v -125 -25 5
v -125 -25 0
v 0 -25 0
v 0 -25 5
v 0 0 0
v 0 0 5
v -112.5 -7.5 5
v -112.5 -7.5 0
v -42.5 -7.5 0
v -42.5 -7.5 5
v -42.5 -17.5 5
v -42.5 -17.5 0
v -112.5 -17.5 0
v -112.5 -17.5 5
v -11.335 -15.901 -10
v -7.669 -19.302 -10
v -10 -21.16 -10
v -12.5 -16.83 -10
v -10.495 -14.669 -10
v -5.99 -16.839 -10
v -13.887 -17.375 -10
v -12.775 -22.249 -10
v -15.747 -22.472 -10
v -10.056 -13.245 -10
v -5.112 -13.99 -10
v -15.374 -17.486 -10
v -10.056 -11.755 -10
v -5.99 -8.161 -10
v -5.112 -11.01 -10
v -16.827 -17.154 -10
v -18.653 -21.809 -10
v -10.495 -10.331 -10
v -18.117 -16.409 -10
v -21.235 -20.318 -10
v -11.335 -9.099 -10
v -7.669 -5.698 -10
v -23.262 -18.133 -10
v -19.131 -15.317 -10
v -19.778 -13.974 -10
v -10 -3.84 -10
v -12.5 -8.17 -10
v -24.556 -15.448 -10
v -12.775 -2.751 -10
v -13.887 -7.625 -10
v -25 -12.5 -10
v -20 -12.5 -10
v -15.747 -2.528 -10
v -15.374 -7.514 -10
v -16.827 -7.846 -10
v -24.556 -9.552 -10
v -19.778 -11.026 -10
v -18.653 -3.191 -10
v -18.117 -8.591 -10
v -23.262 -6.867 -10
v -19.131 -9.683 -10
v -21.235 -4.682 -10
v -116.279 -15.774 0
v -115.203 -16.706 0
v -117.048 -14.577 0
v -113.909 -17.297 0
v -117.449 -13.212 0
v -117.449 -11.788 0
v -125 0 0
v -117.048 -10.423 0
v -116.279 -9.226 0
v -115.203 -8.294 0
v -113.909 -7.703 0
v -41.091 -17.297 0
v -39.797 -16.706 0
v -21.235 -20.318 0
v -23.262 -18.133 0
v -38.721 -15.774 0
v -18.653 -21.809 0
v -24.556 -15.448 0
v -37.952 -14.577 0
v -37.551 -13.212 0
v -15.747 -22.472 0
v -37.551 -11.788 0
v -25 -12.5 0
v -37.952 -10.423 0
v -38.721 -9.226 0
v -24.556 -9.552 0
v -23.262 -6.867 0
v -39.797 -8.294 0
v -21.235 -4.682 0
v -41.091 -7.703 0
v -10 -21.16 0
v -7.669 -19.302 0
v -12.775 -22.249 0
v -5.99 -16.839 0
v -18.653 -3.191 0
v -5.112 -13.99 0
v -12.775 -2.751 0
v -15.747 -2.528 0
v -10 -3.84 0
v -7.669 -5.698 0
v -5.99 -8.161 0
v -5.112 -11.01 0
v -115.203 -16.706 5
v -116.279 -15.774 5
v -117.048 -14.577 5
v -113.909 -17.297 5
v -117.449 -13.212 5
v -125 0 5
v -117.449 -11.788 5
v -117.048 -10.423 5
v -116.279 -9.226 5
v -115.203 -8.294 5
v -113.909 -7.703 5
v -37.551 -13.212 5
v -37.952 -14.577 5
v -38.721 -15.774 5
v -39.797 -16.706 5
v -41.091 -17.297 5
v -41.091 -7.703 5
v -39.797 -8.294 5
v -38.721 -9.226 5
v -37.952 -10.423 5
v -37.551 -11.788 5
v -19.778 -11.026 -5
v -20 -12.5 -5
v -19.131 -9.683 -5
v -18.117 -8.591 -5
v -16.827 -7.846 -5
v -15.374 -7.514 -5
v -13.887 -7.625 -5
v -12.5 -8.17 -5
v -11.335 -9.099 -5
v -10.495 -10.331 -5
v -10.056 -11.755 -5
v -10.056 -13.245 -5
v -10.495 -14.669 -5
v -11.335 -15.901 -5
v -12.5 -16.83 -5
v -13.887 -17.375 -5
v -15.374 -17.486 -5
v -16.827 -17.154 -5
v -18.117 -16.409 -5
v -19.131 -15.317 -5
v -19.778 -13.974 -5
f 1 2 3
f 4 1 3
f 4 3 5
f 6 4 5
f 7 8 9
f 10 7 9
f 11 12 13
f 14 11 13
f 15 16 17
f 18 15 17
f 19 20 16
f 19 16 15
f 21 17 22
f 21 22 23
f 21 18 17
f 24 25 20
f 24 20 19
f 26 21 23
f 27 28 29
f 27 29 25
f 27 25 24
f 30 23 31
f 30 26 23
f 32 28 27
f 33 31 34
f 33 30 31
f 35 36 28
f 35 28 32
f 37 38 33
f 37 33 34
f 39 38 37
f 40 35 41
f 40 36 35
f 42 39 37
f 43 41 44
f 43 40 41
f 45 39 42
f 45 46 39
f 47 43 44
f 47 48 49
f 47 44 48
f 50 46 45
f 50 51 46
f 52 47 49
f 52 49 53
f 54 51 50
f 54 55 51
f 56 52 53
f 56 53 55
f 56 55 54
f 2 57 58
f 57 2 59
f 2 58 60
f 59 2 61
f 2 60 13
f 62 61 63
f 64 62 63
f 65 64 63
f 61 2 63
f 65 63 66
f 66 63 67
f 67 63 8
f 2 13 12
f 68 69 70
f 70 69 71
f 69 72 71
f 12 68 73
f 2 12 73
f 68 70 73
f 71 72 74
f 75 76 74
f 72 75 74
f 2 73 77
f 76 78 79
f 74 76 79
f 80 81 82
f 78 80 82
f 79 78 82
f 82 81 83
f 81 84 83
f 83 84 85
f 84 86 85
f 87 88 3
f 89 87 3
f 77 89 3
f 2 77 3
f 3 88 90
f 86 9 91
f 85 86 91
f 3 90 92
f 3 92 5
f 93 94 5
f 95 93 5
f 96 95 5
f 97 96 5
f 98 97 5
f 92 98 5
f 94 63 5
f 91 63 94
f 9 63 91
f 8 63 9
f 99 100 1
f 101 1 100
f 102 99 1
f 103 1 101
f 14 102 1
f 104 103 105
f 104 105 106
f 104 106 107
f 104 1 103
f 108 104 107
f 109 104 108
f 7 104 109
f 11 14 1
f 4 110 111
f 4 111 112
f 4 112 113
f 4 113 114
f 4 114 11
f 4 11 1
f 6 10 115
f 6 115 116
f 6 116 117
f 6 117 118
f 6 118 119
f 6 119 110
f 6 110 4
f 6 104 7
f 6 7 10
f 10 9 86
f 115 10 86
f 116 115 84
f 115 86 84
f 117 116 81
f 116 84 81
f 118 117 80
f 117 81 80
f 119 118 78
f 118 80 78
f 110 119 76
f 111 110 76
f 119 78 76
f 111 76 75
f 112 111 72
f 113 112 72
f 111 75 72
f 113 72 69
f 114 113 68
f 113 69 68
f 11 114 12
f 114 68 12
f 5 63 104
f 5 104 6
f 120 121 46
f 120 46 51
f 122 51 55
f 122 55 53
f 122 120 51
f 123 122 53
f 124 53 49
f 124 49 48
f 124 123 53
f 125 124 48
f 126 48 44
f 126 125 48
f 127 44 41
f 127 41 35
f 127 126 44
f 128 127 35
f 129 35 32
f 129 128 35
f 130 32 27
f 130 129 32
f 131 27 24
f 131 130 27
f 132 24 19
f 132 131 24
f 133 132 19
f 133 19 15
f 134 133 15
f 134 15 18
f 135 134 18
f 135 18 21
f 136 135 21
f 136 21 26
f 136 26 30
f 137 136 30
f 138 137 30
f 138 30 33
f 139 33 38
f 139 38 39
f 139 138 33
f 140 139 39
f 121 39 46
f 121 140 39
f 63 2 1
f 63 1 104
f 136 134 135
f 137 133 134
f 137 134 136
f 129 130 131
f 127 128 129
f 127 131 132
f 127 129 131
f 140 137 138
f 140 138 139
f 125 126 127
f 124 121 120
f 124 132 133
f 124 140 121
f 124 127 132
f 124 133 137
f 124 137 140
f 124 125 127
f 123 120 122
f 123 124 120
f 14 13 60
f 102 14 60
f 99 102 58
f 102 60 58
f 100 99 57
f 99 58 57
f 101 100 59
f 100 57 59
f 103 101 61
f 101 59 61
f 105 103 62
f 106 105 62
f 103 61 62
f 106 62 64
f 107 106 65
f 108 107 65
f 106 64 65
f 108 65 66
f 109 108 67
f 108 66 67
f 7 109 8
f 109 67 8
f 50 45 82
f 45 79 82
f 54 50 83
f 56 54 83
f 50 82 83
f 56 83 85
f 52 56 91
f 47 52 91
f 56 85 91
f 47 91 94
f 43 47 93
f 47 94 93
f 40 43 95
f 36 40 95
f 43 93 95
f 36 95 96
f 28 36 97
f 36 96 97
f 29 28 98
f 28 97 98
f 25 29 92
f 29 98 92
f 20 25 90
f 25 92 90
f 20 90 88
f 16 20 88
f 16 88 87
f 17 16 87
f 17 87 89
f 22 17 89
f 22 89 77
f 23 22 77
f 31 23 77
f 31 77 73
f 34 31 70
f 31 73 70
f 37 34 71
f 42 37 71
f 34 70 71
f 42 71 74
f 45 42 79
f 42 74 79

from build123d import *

# Parameters (mm, degrees)
SKETCH1_W           = 125
SKETCH1_H           = 25
BOSS_EXTRUDE1_DEPTH = 5
SKETCH2_R           = 10
BOSS_EXTRUDE2_DEPTH = 5
SKETCH3_R           = 10
SKETCH3_R_2         = 5
BOSS_EXTRUDE3_DEPTH = 5


with BuildPart() as part:
    # Sketch1 → Boss-Extrude1 (new body)
    with BuildSketch(Plane.XY):
        with Locations((-62.5, -12.5)):
            Rectangle(SKETCH1_W, SKETCH1_H)
        with BuildLine():
            Line((-112.5, -7.5), (-42.5, -7.5))
            ThreePointArc((-42.5, -7.5), (-37.5, -12.5), (-42.5, -17.5))
            Line((-42.5, -17.5), (-112.5, -17.5))
            ThreePointArc((-112.5, -17.5), (-117.5, -12.5), (-112.5, -7.5))
        make_face(mode=Mode.SUBTRACT)
    extrude(amount=BOSS_EXTRUDE1_DEPTH)

    # Sketch2 → Boss-Extrude2 (add)
    with BuildSketch(Plane(origin=(0, 0, 0), x_dir=(-1, 0, 0), z_dir=(0, 0, -1))):
        with Locations((15, -12.5)):
            Circle(SKETCH2_R)
    extrude(amount=BOSS_EXTRUDE2_DEPTH)

    # Sketch3 → Boss-Extrude3 (add)
    with BuildSketch(Plane(origin=(0, 0, -5), x_dir=(-1, 0, 0), z_dir=(0, 0, -1))):
        with Locations((15, -12.5)):
            Circle(SKETCH3_R)
        with Locations((15, -12.5)):
            Circle(SKETCH3_R_2, mode=Mode.SUBTRACT)
    extrude(amount=BOSS_EXTRUDE3_DEPTH)


solid = part.part
